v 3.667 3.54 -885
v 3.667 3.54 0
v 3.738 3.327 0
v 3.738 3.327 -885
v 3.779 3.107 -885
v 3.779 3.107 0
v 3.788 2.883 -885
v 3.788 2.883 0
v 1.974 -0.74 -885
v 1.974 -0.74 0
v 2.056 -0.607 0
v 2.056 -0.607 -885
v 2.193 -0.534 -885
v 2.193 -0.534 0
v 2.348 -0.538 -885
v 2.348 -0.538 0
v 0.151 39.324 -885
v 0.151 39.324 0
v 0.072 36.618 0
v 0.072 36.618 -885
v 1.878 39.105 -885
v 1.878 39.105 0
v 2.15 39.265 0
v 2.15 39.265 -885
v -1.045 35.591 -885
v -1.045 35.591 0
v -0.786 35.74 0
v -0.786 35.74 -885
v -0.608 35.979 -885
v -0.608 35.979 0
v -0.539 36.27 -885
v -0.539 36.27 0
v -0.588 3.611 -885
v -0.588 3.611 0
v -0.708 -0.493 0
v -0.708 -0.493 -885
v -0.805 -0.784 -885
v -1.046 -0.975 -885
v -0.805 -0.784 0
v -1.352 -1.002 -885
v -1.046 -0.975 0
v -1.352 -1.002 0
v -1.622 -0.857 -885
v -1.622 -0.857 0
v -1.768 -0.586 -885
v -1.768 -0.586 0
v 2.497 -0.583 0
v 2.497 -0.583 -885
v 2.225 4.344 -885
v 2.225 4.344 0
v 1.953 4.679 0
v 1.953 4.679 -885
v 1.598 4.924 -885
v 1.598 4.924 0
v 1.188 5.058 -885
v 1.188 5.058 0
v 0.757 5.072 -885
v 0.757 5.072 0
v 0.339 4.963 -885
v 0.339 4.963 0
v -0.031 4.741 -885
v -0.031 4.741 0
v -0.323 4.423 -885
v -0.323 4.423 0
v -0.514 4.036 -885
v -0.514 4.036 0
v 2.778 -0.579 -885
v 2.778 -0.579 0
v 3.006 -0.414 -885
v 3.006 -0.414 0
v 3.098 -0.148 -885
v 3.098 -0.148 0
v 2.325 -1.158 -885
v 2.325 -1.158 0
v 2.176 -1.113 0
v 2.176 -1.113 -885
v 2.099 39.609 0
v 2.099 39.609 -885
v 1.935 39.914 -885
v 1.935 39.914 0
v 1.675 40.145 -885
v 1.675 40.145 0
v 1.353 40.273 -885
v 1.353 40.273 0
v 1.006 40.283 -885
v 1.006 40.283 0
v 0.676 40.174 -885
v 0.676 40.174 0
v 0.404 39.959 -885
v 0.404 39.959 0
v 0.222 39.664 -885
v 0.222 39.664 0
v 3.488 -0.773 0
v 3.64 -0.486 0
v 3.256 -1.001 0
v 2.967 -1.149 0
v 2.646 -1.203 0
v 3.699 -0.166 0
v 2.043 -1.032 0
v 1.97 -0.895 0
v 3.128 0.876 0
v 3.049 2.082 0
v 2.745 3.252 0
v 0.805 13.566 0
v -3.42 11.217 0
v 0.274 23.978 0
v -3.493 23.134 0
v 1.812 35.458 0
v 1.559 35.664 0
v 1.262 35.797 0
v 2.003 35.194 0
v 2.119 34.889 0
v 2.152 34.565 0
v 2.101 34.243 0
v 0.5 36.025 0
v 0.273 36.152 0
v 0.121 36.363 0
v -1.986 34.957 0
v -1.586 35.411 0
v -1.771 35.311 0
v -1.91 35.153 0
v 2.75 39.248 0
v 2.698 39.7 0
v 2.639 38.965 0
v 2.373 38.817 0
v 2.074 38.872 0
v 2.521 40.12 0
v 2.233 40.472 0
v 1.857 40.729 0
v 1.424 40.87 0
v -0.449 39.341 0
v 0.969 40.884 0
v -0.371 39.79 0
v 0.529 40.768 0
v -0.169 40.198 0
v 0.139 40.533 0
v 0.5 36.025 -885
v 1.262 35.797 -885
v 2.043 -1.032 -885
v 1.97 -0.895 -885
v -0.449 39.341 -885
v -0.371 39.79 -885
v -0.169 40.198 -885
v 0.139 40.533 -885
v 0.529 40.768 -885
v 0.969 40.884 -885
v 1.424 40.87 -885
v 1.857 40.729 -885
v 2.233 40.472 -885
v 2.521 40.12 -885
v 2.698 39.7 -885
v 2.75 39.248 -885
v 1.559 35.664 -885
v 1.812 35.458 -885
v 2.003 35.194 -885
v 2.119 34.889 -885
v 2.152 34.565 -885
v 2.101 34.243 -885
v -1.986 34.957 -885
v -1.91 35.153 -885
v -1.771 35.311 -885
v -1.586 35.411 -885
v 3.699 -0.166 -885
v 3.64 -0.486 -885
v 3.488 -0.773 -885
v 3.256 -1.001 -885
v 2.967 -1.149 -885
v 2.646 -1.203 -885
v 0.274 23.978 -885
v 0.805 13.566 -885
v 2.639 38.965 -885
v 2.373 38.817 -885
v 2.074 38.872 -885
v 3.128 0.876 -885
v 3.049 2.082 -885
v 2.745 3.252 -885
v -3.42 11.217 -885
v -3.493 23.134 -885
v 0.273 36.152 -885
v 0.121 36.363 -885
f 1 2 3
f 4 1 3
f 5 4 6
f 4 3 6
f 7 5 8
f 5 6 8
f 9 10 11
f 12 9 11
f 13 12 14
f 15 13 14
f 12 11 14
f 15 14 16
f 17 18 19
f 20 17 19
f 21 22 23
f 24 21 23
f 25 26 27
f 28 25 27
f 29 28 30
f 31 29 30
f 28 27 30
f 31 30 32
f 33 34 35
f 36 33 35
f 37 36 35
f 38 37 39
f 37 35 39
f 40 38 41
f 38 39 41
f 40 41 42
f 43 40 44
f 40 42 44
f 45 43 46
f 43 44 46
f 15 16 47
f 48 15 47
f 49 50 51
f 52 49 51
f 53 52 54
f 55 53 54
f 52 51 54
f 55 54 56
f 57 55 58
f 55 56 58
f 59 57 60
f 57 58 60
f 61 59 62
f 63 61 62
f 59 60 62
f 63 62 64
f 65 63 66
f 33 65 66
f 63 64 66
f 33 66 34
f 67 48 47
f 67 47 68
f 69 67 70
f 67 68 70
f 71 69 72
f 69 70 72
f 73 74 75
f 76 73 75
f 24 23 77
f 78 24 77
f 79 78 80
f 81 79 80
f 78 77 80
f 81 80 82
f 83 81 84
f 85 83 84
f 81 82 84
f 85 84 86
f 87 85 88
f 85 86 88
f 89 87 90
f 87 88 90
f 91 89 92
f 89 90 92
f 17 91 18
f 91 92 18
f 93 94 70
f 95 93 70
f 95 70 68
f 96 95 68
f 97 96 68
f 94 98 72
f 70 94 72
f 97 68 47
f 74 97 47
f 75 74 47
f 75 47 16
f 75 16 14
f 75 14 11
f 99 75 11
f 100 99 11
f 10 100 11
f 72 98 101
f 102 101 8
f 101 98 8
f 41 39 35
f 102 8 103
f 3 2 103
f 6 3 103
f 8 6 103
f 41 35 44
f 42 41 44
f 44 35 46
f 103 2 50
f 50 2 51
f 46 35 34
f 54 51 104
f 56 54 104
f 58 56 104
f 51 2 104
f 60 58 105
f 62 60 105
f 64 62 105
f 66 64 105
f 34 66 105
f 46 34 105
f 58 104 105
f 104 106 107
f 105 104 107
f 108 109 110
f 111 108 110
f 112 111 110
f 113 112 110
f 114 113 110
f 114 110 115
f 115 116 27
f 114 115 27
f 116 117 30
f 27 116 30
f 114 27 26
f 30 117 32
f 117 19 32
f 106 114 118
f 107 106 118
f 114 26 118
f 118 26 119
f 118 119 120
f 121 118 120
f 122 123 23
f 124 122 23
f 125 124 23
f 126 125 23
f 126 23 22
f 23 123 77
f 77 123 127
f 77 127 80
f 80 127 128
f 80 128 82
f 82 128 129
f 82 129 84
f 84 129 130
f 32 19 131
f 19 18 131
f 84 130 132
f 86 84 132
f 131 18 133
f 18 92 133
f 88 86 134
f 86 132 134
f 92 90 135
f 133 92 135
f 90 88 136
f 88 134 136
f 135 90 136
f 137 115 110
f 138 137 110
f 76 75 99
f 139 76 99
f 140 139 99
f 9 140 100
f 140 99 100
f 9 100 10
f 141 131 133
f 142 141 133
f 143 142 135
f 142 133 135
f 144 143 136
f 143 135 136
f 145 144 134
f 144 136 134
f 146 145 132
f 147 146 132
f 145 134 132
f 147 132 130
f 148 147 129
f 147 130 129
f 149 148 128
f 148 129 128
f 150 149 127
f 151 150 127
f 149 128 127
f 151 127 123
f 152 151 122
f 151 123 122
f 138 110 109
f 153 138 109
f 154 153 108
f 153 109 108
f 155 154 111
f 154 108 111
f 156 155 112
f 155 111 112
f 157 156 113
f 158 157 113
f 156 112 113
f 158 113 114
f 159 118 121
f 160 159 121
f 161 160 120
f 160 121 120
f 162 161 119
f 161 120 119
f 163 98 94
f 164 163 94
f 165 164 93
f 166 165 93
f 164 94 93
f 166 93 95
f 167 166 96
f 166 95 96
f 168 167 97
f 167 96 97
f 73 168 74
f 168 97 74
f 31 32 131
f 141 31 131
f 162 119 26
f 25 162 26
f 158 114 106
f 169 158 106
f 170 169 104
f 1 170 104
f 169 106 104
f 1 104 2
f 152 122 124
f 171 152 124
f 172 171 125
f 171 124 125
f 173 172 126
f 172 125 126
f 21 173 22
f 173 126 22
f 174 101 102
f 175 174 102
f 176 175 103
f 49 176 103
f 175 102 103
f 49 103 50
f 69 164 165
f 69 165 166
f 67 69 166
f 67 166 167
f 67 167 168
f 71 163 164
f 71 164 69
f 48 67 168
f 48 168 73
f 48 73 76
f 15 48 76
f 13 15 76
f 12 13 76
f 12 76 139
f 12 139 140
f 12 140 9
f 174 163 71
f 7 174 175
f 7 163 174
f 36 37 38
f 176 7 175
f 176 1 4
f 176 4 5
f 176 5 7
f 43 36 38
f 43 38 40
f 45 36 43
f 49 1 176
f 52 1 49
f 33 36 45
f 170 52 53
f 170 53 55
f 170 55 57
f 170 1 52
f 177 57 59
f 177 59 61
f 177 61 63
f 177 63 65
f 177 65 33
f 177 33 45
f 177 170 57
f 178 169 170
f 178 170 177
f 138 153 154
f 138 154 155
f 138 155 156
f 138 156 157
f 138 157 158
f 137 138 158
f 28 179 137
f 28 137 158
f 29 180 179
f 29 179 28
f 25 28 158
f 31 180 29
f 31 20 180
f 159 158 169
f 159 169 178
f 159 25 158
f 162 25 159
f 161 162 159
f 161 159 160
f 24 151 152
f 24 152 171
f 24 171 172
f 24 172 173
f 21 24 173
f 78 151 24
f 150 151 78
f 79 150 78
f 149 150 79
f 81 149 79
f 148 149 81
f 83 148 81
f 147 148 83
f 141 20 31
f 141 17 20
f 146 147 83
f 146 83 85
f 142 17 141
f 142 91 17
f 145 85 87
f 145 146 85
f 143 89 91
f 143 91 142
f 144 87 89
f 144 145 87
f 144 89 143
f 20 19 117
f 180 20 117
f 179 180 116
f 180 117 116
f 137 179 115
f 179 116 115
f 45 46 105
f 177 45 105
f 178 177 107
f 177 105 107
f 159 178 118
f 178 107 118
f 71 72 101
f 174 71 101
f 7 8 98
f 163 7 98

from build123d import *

# Parameters (mm, degrees)
BODY_DEPTH                      = 885
SCHNITT_LINEAR_AUSTRAGEN2_DEPTH = 885


with BuildPart() as part:
    # Model → Body (new body)
    with BuildSketch(Plane.XY):
        with BuildLine():
            Line((1.878084628, 39.104629182), (2.149753631, 39.265339178))
            ThreePointArc((2.149753631, 39.265339178), (1.179756728, 40.293308137), (0.151359725, 39.323765061))
            Line((0.151359725, 39.323765061), (0.072230593, 36.617684207))
            ThreePointArc((0.072230593, 36.617684207), (0.185489498, 36.248958877), (0.499809768, 36.025377312))
            Line((0.499809768, 36.025377312), (1.261518581, 35.79721719))
            ThreePointArc((1.261518581, 35.79721719), (2.002767255, 35.193636824), (2.100773109, 34.24276685))
            ThreePointArc((2.100773109, 34.24276685), (0.243973004, 18.756791477), (3.6673456, 3.540232734))
            ThreePointArc((3.6673456, 3.540232734), (3.762278433, 3.217871116), (3.78778584, 2.882791084))
            Line((3.78778584, 2.882791084), (3.698637797, -0.165904914))
            ThreePointArc((3.698637797, -0.165904914), (3.256166133, -1.000710488), (2.324510635, -1.157871399))
            Line((2.324510635, -1.157871399), (2.175621232, -1.113273313))
            ThreePointArc((2.175621232, -1.113273313), (1.997498531, -0.968129525), (1.974178859, -0.739545604))
            Line((1.974178859, -0.739545604), (0.400869285, -0.26828127))
            Line((0.400869285, -0.26828127), (-0.708129005, -0.492759369))
            ThreePointArc((-0.708129005, -0.492759369), (-1.196616048, -1.010909594), (-1.76840947, -0.586466985))
            ThreePointArc((-1.76840947, -0.586466985), (-3.655039198, 17.174334722), (-1.986171677, 34.956919747))
            ThreePointArc((-1.986171677, 34.956919747), (-1.847587365, 35.23826116), (-1.585988155, 35.411248024))
            Line((-1.585988155, 35.411248024), (-1.044699422, 35.590524224))
            ThreePointArc((-1.044699422, 35.590524224), (-0.684484453, 35.850559404), (-0.538564027, 36.270178693))
            Line((-0.538564027, 36.270178693), (-0.448759368, 39.341314215))
            ThreePointArc((-0.448759368, 39.341314215), (1.197302045, 40.893129938), (2.749873366, 39.247781189))
            ThreePointArc((2.749873366, 39.247781189), (2.372981432, 38.816883238), (1.878084628, 39.104629182))
        make_face()
    extrude(amount=-BODY_DEPTH)

    # Skizze3 → Schnitt-Linear austragen2 (cut)
    with BuildSketch(Plane.XY):
        with BuildLine():
            Line((-0.588130108, 3.611006063), (-0.708129005, -0.492759369))
            Line((-0.708129005, -0.492759369), (0.400869714, -0.268279835))
            Line((0.400869714, -0.268279835), (1.974178926, -0.739545381))
            ThreePointArc((1.974178926, -0.739545381), (2.119322659, -0.561422774), (2.347906465, -0.53810304))
            Line((2.347906465, -0.53810304), (2.496795914, -0.582700974))
            ThreePointArc((2.496795914, -0.582700974), (2.904733153, -0.513885986), (3.0984751, -0.148355754))
            Line((3.0984751, -0.148355754), (3.128422919, 0.875806051))
            ThreePointArc((3.128422919, 0.875806051), (2.924721832, 2.674341696), (2.225195598, 4.343739086))
            ThreePointArc((2.225195598, 4.343739086), (0.543823558, 5.032117471), (-0.588130108, 3.611006063))
        make_face()
    extrude(amount=-SCHNITT_LINEAR_AUSTRAGEN2_DEPTH, mode=Mode.SUBTRACT)


with BuildPart() as schnitt_linear_austragen2_kept_piece:
    # of the separate pieces the step leaves, the one the design keeps (schnitt_linear_austragen2_pieces_kept)
    add(part.part.solids().sort_by_distance((-1.986171677, 34.956919747, 0))[0])


solid = schnitt_linear_austragen2_kept_piece.part
